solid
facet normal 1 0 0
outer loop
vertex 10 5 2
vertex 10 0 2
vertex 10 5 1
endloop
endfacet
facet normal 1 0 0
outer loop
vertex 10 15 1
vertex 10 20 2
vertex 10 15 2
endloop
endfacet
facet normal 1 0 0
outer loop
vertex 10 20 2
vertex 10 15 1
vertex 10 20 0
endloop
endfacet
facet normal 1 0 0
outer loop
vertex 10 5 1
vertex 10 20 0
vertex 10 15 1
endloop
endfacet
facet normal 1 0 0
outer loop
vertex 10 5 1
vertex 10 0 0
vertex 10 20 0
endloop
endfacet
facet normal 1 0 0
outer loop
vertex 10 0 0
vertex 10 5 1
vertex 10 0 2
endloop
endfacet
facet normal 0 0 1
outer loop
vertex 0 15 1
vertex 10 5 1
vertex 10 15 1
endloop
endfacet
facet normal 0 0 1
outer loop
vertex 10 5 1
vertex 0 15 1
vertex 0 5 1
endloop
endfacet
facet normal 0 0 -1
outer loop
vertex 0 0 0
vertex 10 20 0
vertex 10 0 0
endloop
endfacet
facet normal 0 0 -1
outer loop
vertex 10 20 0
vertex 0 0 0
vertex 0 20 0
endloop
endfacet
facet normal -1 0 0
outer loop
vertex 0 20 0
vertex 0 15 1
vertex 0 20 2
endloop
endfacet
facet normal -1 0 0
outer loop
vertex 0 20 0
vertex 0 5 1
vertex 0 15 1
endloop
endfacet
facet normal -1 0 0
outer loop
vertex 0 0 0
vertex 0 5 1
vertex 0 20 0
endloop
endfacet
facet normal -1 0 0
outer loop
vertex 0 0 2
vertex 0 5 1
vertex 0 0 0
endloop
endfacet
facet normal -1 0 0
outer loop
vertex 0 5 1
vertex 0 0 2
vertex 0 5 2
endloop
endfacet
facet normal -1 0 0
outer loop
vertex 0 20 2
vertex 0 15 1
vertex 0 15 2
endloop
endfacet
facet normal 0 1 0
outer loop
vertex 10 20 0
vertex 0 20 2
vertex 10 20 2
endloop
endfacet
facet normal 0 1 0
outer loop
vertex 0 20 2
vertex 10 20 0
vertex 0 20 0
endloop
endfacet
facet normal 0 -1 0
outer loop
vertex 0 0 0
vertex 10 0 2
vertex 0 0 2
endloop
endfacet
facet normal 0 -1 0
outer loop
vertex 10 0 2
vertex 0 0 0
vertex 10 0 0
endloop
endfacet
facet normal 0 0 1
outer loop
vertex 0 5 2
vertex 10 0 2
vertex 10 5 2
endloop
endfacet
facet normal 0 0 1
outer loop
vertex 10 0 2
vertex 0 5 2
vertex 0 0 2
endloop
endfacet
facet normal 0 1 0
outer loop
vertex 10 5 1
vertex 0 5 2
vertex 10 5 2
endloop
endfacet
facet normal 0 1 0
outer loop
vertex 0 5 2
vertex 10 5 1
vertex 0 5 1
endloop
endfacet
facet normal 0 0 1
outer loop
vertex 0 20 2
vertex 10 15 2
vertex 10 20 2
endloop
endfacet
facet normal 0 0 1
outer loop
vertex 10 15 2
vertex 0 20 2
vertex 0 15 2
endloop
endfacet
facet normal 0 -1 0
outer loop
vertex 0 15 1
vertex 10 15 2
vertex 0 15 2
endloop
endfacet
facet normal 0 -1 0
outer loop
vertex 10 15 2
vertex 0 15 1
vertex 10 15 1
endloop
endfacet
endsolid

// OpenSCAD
springLength = 20;

mntpadLength = 5;


cube([10, springLength, 1]);

cube([10, mntpadLength, 2]);
translate([0, springLength - mntpadLength, 0]) cube([10, mntpadLength, 2]);
